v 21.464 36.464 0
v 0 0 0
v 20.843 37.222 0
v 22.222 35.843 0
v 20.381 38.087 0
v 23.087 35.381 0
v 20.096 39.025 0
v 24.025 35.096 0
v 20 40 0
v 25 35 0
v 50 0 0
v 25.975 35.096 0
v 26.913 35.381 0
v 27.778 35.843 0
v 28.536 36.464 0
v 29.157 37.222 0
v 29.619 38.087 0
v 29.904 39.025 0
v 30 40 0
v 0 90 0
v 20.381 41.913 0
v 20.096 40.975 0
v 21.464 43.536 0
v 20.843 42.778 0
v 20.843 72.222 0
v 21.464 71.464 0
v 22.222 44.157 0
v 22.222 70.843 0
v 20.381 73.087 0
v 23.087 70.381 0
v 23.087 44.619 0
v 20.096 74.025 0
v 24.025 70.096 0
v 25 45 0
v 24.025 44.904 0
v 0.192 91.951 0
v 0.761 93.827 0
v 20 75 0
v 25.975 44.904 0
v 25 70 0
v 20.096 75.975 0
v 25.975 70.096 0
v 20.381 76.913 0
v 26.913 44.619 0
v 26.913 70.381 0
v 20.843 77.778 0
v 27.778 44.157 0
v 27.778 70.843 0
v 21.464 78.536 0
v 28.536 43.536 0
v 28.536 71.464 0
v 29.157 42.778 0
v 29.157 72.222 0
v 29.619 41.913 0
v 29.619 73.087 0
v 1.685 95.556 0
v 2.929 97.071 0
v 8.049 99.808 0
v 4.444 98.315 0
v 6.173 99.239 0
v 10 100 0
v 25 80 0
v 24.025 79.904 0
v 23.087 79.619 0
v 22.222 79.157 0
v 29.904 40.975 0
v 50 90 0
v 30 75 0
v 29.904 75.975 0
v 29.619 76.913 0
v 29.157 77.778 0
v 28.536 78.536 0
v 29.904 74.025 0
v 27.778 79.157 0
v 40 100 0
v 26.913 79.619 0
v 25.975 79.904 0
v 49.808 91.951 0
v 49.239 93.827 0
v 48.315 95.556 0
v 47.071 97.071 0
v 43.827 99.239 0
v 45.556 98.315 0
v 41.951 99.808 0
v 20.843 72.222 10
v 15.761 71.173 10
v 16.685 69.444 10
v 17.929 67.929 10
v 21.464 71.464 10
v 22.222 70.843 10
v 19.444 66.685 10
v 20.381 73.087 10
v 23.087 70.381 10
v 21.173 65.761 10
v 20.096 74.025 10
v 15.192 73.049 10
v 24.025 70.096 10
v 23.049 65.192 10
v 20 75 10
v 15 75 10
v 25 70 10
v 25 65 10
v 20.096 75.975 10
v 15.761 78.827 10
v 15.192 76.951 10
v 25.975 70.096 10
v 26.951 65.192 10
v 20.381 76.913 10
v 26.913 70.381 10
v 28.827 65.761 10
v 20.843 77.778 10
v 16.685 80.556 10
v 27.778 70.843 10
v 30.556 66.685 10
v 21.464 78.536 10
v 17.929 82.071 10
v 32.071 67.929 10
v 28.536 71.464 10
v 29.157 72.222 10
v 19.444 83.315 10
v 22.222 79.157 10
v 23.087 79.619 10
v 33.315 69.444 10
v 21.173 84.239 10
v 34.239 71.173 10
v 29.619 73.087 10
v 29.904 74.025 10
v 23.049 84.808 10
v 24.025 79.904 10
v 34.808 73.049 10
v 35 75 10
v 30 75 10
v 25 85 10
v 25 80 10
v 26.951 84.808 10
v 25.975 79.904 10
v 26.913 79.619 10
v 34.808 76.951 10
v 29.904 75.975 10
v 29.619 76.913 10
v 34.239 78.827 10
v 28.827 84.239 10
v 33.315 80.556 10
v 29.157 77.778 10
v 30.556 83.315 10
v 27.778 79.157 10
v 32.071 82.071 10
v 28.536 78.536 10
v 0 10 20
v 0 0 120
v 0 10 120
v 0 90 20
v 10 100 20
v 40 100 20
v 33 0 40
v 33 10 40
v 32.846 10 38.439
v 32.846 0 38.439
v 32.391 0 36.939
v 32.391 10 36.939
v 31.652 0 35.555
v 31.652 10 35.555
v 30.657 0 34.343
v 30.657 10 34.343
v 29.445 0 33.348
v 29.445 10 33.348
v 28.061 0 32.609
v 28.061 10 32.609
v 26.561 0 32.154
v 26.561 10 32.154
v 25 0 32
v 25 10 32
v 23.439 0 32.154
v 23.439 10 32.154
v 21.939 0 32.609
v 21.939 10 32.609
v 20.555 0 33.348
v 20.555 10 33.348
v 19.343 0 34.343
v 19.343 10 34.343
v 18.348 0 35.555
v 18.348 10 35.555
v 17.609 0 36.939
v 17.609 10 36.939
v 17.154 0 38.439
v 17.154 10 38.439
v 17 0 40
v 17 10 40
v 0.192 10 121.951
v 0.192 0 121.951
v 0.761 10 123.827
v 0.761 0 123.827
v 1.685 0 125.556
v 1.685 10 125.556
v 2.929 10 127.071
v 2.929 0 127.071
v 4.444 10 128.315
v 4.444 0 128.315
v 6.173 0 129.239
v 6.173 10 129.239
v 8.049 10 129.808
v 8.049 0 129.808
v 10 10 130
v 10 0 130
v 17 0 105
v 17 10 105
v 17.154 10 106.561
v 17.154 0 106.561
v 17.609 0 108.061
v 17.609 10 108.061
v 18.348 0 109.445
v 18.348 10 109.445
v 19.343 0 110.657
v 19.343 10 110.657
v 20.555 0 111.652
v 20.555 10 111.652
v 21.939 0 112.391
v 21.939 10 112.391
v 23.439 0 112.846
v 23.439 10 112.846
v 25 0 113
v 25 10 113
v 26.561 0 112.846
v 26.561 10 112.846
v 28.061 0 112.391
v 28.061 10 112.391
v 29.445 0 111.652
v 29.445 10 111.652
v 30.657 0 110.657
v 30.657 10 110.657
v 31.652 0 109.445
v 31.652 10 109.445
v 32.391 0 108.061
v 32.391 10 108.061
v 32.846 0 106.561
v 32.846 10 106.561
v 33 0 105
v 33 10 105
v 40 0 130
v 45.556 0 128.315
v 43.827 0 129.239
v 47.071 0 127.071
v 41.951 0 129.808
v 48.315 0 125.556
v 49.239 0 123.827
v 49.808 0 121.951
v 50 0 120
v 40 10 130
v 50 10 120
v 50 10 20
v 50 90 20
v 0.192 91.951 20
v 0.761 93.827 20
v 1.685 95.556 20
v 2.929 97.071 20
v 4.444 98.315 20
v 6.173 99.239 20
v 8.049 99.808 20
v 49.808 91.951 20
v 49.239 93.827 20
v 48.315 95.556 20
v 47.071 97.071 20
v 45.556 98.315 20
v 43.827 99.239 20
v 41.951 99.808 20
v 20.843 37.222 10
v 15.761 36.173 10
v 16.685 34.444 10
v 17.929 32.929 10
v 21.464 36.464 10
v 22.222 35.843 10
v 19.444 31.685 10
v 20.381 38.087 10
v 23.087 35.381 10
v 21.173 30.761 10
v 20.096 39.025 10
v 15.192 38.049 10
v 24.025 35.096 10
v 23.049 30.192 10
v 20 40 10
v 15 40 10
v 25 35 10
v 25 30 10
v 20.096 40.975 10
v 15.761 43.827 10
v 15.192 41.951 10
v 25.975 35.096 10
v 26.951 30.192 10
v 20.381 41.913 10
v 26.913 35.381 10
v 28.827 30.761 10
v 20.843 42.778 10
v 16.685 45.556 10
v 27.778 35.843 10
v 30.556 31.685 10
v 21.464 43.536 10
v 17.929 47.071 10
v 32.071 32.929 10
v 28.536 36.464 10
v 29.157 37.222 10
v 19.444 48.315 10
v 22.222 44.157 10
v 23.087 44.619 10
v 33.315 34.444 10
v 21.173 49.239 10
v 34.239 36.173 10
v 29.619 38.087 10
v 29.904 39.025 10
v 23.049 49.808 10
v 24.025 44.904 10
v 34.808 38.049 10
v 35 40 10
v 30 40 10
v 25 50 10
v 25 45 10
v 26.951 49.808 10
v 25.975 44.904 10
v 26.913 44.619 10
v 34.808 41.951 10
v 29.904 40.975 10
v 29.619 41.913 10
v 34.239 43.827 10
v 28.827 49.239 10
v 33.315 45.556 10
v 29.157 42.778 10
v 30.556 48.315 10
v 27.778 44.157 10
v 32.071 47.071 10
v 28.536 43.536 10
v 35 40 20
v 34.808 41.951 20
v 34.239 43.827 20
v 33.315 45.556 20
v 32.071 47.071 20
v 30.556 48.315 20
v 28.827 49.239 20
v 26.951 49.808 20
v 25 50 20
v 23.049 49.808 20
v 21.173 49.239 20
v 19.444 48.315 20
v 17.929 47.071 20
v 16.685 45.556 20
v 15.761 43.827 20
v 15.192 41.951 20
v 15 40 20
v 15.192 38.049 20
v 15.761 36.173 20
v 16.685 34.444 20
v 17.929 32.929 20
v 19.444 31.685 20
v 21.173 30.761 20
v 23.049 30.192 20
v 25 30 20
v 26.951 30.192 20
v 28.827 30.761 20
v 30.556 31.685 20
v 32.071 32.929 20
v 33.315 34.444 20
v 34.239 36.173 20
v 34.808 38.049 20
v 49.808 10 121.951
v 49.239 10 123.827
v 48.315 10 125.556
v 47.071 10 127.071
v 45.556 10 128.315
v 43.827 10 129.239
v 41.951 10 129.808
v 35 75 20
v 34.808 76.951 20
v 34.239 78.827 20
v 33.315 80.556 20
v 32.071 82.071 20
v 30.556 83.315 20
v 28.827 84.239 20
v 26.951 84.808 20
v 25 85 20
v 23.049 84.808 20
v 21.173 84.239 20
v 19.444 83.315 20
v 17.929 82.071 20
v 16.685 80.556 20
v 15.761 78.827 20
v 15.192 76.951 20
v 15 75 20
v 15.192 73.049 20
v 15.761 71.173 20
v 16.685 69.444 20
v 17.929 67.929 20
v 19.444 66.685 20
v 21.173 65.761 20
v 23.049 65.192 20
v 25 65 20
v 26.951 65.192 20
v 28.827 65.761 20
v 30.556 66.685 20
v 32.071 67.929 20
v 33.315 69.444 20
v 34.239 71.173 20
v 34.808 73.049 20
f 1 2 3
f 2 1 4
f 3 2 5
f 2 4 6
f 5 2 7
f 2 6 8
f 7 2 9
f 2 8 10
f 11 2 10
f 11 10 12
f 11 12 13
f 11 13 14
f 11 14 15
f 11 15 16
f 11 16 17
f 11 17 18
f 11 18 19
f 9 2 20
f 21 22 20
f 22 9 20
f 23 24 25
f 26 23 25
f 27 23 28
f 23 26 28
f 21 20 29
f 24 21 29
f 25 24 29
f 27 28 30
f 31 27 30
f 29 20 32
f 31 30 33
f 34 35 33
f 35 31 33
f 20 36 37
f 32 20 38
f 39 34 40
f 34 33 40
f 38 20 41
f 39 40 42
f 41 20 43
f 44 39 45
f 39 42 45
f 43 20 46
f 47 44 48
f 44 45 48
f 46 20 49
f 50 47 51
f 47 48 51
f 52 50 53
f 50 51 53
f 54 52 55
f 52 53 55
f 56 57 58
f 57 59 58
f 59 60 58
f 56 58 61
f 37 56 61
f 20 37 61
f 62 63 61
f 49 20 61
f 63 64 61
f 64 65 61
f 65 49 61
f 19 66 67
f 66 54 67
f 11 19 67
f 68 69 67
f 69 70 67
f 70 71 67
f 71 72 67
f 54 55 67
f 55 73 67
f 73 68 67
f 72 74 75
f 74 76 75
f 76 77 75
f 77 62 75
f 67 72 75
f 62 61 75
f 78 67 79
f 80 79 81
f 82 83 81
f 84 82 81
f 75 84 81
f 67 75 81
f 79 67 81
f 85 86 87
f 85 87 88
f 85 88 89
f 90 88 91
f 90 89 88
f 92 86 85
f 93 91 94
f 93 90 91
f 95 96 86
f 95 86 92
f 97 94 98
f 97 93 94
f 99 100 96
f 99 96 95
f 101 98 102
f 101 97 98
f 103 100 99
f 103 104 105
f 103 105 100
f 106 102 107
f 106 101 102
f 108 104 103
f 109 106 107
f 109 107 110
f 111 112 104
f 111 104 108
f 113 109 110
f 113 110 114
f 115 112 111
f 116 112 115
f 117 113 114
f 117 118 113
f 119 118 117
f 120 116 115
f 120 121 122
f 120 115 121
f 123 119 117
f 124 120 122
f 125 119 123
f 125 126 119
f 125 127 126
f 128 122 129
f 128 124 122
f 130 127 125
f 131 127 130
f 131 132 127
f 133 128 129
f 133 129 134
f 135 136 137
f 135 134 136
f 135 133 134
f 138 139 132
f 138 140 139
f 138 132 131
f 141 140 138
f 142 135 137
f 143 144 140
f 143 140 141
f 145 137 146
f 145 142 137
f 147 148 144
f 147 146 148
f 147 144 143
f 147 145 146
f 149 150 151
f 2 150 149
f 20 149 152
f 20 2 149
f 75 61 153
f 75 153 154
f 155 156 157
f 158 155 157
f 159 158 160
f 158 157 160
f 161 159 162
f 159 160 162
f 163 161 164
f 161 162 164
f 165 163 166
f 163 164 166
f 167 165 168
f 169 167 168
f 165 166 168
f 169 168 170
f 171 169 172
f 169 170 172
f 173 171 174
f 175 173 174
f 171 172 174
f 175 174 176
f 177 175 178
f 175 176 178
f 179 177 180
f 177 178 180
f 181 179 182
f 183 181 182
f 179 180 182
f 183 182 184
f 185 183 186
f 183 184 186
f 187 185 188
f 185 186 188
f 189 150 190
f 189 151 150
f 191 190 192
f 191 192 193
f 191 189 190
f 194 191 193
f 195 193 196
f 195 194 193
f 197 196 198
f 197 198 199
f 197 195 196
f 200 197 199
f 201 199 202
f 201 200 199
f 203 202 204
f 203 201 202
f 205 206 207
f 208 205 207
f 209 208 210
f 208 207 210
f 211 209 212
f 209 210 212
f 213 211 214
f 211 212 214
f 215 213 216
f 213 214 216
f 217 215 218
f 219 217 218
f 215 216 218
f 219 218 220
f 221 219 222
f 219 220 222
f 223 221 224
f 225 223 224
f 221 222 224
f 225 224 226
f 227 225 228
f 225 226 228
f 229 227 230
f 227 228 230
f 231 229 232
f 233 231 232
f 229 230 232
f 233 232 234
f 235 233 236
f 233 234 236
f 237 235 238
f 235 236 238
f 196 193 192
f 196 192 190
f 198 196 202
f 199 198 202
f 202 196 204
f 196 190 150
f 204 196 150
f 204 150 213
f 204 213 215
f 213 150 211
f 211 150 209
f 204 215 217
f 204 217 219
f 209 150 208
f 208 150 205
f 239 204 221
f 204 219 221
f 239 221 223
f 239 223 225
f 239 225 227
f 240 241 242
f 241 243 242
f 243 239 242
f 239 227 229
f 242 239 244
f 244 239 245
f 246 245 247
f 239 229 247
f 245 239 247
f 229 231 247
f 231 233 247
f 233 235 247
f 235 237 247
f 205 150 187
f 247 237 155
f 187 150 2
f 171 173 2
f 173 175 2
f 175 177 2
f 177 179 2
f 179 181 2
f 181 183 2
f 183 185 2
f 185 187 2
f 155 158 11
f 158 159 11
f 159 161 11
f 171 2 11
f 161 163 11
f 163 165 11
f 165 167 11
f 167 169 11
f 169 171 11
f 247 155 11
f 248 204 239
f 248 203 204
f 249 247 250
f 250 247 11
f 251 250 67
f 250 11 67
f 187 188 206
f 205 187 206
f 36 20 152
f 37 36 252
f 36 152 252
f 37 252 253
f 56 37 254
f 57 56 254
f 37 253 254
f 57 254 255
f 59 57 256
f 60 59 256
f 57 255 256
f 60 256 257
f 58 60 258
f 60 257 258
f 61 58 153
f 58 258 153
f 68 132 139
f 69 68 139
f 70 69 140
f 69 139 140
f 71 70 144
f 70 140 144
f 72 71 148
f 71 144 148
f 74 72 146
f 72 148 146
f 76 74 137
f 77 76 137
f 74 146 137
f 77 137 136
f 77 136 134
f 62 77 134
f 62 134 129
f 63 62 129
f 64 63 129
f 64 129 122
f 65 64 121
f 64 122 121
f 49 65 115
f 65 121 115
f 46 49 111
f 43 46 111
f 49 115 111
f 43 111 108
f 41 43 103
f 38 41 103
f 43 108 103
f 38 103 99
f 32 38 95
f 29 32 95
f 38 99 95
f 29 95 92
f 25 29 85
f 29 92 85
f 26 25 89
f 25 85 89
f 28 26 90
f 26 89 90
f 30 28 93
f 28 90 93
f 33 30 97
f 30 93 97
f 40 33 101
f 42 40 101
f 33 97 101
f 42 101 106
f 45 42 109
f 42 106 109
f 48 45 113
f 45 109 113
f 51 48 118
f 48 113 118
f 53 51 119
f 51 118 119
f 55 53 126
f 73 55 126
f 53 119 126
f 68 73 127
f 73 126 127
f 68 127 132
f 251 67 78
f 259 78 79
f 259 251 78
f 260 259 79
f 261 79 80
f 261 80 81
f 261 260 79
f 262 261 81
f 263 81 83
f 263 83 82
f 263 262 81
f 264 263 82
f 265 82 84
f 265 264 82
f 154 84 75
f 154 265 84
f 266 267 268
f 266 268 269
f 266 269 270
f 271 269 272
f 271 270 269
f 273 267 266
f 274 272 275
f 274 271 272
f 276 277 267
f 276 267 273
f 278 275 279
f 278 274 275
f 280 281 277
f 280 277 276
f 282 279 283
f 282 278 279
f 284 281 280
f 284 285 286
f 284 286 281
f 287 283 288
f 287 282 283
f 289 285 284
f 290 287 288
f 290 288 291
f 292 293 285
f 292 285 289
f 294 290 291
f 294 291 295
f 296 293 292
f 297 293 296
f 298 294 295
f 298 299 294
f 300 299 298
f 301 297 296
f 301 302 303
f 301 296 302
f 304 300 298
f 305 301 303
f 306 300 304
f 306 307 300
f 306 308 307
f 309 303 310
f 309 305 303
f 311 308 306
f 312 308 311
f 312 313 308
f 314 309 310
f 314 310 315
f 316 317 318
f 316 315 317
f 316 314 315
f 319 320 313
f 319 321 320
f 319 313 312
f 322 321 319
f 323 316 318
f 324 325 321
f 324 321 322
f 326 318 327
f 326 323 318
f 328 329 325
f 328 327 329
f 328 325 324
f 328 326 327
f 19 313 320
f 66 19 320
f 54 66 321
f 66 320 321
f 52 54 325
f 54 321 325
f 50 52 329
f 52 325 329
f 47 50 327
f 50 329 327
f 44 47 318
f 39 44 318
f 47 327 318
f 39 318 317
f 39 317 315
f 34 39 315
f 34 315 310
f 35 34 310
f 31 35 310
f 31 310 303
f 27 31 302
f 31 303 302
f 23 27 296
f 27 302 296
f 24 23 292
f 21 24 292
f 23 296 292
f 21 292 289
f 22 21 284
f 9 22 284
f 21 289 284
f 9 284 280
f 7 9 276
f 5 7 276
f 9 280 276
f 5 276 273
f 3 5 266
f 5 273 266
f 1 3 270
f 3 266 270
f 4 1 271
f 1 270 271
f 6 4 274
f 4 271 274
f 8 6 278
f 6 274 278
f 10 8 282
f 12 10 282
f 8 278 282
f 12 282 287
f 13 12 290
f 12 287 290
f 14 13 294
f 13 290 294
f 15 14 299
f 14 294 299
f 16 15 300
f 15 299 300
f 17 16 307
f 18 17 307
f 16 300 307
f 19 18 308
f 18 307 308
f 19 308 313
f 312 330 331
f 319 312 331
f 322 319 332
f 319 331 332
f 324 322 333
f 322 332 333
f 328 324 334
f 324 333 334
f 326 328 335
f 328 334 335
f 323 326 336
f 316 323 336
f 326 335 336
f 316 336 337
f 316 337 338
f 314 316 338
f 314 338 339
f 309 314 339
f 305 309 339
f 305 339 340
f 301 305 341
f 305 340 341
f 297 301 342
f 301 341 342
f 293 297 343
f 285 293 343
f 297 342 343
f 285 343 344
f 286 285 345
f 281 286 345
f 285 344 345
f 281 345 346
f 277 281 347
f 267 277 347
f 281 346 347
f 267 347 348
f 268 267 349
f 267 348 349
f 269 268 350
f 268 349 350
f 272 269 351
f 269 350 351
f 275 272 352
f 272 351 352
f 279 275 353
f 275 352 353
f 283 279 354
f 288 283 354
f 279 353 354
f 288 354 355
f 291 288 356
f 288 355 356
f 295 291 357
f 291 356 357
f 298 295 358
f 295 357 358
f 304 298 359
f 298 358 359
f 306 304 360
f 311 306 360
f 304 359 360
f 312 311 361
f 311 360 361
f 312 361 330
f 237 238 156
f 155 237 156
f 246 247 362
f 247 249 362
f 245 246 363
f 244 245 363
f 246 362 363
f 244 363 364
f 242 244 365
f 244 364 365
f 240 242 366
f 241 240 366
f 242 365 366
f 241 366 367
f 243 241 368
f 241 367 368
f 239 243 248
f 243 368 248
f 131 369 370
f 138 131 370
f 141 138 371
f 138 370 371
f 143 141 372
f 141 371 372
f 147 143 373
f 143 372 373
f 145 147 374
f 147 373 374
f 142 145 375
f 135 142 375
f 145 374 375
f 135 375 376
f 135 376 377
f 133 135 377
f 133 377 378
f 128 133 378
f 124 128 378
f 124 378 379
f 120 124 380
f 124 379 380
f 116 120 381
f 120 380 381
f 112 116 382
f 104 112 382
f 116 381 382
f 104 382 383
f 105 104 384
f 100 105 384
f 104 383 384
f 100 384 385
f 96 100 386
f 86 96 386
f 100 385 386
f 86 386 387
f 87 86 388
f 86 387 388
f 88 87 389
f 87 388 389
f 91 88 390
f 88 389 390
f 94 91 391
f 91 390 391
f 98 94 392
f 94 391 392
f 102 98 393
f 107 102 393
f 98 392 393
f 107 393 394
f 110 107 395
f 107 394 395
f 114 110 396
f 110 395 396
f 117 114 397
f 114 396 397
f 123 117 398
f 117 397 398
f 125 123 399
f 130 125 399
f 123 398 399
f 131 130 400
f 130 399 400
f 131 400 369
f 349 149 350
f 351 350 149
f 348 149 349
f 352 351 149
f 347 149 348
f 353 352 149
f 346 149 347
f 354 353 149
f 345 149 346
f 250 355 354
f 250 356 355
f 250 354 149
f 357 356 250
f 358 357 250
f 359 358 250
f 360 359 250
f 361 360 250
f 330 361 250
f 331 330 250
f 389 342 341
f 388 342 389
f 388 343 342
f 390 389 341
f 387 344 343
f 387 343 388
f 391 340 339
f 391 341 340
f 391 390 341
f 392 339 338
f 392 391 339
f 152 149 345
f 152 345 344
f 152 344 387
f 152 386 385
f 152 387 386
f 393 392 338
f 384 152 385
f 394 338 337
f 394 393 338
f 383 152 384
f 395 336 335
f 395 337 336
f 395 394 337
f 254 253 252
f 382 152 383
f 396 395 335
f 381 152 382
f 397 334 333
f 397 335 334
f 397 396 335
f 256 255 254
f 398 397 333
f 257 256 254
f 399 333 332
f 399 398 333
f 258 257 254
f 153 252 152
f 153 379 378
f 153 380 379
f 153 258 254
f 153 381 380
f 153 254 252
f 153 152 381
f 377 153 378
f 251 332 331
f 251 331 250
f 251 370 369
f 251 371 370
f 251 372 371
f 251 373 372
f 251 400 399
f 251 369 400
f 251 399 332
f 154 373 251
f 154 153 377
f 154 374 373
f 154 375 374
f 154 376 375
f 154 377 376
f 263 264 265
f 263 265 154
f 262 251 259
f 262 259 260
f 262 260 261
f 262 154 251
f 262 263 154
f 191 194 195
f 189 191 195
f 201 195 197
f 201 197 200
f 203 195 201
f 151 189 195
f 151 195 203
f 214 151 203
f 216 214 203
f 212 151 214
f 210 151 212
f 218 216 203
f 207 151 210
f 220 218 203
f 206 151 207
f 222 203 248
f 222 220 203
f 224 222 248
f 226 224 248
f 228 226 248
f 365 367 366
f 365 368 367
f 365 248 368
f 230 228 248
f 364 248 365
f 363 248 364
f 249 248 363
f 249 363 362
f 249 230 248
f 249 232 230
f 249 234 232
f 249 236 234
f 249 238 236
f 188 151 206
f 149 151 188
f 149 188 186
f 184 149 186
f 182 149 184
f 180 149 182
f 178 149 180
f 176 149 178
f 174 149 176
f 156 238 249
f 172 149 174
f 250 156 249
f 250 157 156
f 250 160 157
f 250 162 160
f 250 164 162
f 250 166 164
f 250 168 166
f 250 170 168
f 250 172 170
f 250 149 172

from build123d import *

# Parameters (mm, degrees)
F0_W      = 50
F0_H      = 100
F1_DEPTH  = 20
F2_R      = 10
F3_DEPTH  = 10
F4_R      = 5
F5_DEPTH  = 10
F6_R      = 5
F7_DEPTH  = 10
F8_W      = 50
F8_H      = 10
F9_DEPTH  = 110
F10_R     = 10
F12_DEPTH = 10


with BuildPart() as f1:
    # F0 (on Top) → F1 (new body)
    with BuildSketch(Plane.XY):
        with Locations((25, 50)):
            Rectangle(F0_W, F0_H)
    extrude(amount=F1_DEPTH)

    # F2 (on face) → F3 (cut)
    with BuildSketch(Plane.XY.offset(20)):
        with Locations((25, 75)):
            Circle(F2_R)
        with Locations((25, 40)):
            Circle(F2_R)
    extrude(amount=-F3_DEPTH, mode=Mode.SUBTRACT)

    # F4 (on face) → F5 (cut)
    with BuildSketch(Plane.XY.offset(10)):
        with Locations((25, 75)):
            Circle(F4_R)
    extrude(amount=-F5_DEPTH, mode=Mode.SUBTRACT)

    # F6 (on face) → F7 (cut)
    with BuildSketch(Plane.XY.offset(10)):
        with Locations((25, 40)):
            Circle(F6_R)
    extrude(amount=-F7_DEPTH, mode=Mode.SUBTRACT)

    # F8 (on face) → F9 (join)
    with BuildSketch(Plane.XY.offset(20)):
        with Locations((25, 5)):
            Rectangle(F8_W, F8_H)
    extrude(amount=F9_DEPTH)

    # F10
    f10_edges = [f1.edges().sort_by_distance(p)[0] for p in [
        (0, 100, 10),
        (50, 100, 10),
        (0, 5, 130),
        (50, 5, 130),
    ]]
    fillet(f10_edges, radius=F10_R)

    # F11 (on face) → F12 (cut)
    with BuildSketch(Plane(origin=(0, 10, 0), x_dir=(-1, 0, 0), z_dir=(0, 1, 0))):
        with BuildLine():
            Line((-33, 105), (-33, 40))
            ThreePointArc((-33, 40), (-25, 32), (-17, 40))
            Line((-17, 40), (-17, 105))
            ThreePointArc((-17, 105), (-25, 113), (-33, 105))
        make_face()
    extrude(amount=-F12_DEPTH, mode=Mode.SUBTRACT)


solid = f1.part
